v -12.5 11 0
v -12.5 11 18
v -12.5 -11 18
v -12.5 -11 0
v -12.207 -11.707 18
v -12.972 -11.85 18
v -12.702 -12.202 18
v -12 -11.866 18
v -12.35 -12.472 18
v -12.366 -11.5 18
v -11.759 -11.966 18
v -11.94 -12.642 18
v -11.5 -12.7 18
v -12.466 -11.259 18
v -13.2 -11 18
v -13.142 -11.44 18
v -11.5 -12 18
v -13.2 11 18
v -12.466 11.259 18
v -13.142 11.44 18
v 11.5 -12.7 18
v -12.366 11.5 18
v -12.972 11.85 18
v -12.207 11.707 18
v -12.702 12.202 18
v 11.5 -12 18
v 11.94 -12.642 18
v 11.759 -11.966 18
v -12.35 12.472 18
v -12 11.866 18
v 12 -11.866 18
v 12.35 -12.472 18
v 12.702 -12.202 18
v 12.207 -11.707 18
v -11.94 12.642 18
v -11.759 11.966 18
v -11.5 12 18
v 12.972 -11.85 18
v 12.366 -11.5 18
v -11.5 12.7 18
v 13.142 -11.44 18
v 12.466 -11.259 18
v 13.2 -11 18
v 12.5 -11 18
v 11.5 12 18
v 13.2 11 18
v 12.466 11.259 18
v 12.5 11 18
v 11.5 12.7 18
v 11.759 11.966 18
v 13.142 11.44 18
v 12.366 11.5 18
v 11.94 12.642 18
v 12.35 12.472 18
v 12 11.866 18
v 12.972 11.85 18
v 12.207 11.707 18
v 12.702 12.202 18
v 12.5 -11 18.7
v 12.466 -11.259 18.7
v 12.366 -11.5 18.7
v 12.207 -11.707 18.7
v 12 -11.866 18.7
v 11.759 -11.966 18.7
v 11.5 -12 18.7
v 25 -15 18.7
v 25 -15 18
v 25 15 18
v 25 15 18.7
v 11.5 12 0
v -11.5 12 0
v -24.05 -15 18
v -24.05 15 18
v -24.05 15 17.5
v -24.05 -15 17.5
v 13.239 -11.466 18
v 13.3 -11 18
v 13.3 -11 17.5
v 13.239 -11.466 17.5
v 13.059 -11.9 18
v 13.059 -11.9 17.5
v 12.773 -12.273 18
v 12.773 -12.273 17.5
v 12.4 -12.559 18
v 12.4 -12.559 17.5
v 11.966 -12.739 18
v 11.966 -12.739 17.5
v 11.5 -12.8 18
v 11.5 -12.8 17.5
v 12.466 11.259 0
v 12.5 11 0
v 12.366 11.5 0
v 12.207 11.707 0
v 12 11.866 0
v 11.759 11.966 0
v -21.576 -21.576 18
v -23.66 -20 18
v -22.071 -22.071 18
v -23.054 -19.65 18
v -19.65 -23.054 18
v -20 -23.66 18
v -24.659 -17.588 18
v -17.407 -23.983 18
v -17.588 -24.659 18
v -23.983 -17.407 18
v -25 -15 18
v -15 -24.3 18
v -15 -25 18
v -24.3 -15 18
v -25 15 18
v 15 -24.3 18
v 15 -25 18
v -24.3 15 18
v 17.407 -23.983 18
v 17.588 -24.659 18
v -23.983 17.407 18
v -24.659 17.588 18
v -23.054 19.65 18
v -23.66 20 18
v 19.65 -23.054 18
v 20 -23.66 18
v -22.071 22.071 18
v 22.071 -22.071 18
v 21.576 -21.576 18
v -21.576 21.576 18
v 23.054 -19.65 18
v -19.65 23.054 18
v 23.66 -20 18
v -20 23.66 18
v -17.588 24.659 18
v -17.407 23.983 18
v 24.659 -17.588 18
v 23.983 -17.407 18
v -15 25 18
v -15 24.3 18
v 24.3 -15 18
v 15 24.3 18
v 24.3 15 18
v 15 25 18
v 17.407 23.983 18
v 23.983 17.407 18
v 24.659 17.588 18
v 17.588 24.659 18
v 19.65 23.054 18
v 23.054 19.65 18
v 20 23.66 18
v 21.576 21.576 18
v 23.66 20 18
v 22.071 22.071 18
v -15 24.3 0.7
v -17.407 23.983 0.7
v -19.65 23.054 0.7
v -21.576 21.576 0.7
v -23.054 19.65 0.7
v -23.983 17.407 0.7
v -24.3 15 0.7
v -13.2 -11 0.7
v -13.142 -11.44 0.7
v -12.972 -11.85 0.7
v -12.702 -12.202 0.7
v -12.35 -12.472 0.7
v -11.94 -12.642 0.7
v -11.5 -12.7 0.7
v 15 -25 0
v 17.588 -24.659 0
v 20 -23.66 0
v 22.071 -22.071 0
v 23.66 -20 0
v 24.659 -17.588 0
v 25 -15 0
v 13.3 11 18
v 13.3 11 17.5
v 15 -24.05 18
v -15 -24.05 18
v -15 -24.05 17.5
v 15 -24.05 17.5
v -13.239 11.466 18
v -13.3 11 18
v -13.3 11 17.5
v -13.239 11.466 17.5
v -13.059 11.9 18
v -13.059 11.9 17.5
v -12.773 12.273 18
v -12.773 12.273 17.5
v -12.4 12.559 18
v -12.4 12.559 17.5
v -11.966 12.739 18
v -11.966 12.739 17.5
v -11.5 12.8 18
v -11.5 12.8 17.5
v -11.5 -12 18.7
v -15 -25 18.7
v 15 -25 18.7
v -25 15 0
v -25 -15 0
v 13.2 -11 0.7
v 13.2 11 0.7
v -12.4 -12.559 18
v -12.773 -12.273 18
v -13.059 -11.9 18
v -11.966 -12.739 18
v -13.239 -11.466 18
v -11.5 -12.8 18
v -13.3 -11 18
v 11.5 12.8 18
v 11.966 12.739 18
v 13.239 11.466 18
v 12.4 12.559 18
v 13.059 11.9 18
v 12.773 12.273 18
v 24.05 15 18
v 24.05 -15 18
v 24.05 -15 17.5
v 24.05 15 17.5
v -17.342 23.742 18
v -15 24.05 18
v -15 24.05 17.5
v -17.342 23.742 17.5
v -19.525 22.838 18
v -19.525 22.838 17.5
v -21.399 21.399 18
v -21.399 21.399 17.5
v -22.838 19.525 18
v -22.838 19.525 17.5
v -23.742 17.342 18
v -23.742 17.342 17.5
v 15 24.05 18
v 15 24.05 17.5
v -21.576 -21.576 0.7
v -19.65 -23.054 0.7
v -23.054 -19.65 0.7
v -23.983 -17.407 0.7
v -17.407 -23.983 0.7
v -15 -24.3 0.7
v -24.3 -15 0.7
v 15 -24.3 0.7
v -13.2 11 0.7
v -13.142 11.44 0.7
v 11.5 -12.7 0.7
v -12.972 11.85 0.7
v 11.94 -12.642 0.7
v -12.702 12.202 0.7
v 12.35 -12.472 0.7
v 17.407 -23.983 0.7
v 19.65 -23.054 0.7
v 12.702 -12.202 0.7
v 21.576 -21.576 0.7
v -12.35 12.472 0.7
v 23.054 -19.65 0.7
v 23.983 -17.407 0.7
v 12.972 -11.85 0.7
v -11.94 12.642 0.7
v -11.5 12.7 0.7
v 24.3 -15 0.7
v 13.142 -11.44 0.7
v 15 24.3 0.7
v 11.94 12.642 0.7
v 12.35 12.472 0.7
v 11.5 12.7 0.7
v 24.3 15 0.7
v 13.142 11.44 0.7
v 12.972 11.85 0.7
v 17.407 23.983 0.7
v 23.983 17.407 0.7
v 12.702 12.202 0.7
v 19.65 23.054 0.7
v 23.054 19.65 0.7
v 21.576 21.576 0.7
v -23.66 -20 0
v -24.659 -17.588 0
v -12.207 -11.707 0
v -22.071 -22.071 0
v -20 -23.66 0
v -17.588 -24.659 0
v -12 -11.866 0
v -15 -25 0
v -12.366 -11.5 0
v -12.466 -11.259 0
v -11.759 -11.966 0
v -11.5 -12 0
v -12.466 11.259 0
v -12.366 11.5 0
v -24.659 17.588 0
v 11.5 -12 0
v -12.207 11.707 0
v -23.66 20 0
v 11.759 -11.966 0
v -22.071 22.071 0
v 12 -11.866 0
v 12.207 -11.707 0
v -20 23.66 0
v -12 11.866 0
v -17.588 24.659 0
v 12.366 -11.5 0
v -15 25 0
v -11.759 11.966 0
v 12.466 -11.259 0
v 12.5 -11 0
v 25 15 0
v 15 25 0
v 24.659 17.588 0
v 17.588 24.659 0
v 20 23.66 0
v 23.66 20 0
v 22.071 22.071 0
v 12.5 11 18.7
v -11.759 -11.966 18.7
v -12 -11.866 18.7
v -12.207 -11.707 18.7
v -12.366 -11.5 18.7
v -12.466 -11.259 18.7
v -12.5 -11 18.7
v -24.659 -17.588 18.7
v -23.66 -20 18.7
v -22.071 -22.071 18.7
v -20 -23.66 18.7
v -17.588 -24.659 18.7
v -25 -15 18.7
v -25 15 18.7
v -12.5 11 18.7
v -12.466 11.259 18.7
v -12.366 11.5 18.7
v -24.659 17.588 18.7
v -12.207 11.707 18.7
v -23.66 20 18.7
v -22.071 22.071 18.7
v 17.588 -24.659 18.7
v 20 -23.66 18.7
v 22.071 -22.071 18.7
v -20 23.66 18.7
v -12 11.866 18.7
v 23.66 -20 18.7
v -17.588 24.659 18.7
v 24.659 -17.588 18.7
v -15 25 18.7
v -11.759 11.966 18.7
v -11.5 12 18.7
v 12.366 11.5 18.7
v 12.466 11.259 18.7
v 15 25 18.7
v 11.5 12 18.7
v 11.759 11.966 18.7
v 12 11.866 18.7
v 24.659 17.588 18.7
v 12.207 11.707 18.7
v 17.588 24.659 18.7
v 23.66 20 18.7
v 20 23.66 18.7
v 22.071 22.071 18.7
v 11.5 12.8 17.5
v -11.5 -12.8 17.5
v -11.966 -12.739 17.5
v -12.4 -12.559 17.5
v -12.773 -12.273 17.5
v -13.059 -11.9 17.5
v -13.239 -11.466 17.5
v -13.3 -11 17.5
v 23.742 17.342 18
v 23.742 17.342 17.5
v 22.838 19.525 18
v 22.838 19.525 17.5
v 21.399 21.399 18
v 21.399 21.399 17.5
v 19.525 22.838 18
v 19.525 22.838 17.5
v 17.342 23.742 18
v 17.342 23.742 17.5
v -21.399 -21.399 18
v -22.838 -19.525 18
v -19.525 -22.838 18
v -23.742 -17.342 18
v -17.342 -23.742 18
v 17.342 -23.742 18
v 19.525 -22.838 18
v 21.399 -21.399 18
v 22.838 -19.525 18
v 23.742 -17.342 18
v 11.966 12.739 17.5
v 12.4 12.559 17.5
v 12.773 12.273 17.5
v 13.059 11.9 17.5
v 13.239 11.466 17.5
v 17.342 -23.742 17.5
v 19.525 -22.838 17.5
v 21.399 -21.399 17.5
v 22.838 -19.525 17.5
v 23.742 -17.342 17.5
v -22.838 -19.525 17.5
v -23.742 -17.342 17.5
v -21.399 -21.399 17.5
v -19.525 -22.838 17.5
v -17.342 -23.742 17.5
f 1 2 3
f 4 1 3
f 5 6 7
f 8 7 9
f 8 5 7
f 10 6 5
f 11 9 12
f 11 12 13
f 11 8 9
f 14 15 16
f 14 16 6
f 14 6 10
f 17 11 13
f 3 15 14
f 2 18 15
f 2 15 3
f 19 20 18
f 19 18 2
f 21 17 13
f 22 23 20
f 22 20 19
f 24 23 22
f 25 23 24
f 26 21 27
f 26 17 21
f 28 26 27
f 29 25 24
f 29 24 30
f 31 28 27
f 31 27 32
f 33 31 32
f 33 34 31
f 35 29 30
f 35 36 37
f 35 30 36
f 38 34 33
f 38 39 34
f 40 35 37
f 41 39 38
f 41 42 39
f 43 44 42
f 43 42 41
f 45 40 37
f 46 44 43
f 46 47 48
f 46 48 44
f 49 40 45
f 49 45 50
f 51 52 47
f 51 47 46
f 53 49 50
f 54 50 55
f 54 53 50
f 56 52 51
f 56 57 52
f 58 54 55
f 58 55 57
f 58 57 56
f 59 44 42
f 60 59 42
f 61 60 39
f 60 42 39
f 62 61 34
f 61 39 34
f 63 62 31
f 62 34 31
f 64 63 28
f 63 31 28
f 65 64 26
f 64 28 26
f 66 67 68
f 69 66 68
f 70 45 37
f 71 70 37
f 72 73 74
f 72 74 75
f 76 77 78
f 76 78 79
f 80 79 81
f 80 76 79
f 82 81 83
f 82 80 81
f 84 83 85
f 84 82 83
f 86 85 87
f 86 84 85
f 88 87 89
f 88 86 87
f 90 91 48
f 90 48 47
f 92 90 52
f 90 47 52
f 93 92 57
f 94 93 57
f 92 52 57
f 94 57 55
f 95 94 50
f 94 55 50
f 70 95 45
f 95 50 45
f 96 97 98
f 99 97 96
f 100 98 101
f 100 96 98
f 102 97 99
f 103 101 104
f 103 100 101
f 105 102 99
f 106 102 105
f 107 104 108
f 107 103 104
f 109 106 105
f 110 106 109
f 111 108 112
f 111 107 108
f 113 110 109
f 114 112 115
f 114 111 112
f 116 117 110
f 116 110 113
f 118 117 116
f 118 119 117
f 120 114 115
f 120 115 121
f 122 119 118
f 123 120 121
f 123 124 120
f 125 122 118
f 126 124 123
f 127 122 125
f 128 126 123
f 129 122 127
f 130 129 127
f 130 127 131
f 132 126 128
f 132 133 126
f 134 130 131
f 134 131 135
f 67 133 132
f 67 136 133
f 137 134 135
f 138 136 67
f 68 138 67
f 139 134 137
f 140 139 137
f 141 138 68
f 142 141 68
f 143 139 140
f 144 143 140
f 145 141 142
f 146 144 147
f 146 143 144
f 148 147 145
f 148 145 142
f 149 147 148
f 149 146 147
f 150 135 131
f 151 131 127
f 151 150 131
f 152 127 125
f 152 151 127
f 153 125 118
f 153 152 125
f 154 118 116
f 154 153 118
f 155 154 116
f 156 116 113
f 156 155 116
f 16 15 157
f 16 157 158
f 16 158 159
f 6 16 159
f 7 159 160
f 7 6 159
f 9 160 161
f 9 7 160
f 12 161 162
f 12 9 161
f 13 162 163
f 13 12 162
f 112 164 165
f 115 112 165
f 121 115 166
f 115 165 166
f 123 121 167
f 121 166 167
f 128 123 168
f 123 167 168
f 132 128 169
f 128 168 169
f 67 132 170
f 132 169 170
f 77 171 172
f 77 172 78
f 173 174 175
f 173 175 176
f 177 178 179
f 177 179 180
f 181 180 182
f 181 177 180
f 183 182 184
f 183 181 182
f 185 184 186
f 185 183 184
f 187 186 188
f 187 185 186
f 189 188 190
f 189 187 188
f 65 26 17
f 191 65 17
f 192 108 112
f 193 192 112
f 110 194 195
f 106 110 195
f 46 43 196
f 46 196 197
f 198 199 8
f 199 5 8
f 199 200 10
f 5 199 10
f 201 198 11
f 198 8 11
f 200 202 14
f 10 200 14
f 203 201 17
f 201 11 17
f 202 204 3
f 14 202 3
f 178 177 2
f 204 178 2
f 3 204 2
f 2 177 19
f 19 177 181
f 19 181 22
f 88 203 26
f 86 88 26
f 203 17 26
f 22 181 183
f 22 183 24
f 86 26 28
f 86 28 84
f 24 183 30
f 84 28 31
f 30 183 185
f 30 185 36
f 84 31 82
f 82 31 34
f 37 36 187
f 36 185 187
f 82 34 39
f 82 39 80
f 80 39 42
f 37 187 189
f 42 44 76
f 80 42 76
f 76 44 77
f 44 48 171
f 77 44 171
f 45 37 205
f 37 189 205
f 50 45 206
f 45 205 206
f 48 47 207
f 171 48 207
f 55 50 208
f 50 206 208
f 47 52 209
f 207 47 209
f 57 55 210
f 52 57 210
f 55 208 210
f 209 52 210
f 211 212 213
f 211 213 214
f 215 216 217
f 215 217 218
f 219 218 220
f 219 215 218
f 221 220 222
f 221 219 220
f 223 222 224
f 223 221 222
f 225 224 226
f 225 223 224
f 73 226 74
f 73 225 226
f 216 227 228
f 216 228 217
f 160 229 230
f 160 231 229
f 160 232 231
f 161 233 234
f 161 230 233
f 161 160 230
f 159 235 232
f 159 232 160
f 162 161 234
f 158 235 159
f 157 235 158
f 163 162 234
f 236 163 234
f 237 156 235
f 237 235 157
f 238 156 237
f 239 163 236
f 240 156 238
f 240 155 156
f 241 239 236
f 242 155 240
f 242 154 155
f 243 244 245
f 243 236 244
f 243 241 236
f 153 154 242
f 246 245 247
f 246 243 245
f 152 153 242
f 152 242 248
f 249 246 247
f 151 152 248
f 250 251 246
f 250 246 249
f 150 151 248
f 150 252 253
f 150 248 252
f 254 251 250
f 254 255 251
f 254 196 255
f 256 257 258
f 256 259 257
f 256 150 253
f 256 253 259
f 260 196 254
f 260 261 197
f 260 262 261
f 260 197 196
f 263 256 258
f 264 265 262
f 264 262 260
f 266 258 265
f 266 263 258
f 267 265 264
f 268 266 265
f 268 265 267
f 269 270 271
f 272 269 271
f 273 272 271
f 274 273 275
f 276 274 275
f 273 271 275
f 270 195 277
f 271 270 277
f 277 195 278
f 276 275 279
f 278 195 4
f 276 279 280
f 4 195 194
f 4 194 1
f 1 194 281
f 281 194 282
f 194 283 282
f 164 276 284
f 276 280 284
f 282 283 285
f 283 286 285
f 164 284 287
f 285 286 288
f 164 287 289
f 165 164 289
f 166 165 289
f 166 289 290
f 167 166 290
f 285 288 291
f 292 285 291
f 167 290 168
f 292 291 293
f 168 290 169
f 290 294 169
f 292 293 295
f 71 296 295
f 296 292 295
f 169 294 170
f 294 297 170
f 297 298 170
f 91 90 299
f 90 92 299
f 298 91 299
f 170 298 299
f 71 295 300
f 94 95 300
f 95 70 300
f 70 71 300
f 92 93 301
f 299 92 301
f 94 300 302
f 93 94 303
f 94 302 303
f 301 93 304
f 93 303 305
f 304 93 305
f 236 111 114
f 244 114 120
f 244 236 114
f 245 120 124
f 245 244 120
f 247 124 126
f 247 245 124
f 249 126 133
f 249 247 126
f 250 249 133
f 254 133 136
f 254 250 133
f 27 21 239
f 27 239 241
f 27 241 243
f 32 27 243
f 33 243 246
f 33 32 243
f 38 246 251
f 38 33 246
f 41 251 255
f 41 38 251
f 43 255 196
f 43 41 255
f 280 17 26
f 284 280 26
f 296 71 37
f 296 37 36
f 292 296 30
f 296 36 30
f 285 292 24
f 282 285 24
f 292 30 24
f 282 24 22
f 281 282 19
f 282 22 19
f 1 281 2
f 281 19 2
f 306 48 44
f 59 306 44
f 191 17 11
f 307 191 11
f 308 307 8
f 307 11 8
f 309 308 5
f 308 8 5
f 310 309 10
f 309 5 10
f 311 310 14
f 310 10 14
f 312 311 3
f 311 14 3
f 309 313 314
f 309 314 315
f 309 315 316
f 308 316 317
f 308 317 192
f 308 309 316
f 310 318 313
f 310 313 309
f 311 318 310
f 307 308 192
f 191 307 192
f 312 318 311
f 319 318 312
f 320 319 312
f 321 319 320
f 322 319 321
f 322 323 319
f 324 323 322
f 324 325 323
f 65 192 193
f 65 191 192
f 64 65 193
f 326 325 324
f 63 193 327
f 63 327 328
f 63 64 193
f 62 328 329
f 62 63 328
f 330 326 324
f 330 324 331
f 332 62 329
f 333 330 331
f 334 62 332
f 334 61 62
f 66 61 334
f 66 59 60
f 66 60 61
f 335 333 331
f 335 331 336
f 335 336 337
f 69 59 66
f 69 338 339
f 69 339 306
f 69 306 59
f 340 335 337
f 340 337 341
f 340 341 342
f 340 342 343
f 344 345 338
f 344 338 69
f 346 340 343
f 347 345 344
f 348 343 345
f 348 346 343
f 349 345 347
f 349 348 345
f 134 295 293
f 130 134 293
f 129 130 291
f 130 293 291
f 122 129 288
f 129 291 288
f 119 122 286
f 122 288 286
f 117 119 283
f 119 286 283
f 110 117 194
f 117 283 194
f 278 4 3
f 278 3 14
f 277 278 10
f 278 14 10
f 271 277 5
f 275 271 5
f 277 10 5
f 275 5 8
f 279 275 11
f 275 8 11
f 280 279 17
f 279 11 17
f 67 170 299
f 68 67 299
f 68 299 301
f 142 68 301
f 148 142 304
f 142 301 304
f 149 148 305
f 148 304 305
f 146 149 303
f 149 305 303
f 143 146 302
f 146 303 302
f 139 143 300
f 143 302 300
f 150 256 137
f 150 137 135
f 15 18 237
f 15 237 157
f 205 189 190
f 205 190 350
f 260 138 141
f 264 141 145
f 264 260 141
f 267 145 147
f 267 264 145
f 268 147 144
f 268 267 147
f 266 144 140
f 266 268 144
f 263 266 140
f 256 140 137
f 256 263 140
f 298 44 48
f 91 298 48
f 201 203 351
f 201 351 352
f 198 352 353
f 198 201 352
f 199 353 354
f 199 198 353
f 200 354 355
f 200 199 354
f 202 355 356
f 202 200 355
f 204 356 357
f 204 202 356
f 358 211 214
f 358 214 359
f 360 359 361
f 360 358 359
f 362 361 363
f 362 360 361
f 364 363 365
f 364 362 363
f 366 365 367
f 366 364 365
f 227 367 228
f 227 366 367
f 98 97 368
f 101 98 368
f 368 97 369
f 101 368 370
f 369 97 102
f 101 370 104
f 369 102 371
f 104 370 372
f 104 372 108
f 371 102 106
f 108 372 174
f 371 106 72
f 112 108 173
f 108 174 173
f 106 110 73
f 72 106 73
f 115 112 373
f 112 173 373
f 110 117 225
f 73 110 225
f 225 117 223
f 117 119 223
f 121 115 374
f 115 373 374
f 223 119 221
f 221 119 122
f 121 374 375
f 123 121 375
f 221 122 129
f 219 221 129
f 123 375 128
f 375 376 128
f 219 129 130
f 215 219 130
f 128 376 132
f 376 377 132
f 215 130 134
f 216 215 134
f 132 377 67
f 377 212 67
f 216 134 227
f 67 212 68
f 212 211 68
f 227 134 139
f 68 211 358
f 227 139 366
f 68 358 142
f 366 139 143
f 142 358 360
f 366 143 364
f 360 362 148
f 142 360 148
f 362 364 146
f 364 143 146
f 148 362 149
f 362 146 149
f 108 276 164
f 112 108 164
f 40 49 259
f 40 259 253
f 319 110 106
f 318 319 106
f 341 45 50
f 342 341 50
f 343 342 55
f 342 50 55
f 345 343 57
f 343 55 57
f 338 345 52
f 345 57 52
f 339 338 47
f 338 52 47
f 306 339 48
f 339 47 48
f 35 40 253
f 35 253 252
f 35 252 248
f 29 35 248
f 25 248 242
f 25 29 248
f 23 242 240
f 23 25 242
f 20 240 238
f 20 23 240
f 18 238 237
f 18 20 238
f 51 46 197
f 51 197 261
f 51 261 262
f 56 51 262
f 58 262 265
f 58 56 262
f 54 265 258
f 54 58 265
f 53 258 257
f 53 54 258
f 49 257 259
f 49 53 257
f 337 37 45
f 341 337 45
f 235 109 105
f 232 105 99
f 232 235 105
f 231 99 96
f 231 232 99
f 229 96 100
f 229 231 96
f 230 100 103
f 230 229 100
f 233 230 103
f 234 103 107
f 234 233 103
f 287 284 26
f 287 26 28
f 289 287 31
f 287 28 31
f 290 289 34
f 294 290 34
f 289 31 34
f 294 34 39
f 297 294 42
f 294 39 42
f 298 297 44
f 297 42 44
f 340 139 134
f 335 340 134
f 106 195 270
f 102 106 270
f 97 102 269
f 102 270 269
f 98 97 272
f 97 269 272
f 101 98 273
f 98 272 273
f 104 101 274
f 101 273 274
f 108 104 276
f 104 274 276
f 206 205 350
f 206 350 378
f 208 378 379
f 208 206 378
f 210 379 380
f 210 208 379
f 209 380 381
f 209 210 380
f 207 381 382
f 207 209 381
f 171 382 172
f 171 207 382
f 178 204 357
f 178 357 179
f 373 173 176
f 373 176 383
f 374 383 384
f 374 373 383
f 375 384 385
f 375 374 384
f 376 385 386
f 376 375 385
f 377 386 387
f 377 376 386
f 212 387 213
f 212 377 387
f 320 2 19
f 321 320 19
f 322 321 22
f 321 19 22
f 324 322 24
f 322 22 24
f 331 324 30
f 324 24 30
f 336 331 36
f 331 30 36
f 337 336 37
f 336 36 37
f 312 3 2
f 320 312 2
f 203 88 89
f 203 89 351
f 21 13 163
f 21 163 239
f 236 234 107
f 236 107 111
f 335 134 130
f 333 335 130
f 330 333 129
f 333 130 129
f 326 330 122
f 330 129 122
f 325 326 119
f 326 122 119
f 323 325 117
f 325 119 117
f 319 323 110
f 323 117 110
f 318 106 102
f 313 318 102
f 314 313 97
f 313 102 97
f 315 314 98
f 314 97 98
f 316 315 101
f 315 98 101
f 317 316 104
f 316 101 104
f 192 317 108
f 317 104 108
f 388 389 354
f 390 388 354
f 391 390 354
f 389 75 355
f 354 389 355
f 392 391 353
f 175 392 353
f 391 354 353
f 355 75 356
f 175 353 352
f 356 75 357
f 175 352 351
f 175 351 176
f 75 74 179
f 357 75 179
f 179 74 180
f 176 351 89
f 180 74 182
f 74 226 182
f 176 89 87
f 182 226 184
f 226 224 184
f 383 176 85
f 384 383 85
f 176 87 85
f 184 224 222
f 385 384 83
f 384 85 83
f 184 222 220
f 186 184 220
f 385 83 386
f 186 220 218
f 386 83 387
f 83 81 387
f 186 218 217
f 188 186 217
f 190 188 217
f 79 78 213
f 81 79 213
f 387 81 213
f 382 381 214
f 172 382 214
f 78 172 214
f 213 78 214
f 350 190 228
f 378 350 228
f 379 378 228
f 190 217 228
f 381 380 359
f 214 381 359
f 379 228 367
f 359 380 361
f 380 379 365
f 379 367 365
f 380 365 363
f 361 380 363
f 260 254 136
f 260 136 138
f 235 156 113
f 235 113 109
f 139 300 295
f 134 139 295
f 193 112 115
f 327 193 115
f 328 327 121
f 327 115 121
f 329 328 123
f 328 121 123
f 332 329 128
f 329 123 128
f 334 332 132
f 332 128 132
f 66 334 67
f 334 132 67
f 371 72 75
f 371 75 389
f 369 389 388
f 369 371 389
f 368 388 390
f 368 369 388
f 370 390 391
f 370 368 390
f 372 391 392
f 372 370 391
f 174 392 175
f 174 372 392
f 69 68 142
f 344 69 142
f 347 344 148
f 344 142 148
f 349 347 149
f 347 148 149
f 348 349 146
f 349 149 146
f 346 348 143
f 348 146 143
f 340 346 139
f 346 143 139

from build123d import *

# Parameters (mm, degrees)
F1_DEPTH = 18
F3_DEPTH = 18.001
F4_T     = -0.7
F6_DEPTH = 0.5
F8_DEPTH = 0.7


with BuildPart() as f1:
    # F0 (on Top) → F1 (new body)
    with BuildSketch(Plane.XY):
        with BuildLine():
            ThreePointArc((25, 15), (22.0710678119, 22.0710678119), (15, 25))
            Line((15, 25), (-15, 25))
            ThreePointArc((-15, 25), (-22.0710678119, 22.0710678119), (-25, 15))
            Line((-25, 15), (-25, -15))
            ThreePointArc((-25, -15), (-22.0710678119, -22.0710678119), (-15, -25))
            Line((-15, -25), (15, -25))
            ThreePointArc((15, -25), (22.0710678119, -22.0710678119), (25, -15))
            Line((25, -15), (25, 15))
        make_face()
    extrude(amount=F1_DEPTH)

    # F2 (on face) → F3 (cut, through all)
    with BuildSketch(Plane.XY.offset(18)):
        with BuildLine():
            ThreePointArc((12.5, 11), (12.2071067812, 11.7071067812), (11.5, 12))
            Line((11.5, 12), (-11.5, 12))
            ThreePointArc((-11.5, 12), (-12.2071067812, 11.7071067812), (-12.5, 11))
            Line((-12.5, 11), (-12.5, -11))
            ThreePointArc((-12.5, -11), (-12.2071067812, -11.7071067812), (-11.5, -12))
            Line((-11.5, -12), (11.5, -12))
            ThreePointArc((11.5, -12), (12.2071067812, -11.7071067812), (12.5, -11))
            Line((12.5, -11), (12.5, 11))
        make_face()
    extrude(amount=-F3_DEPTH, mode=Mode.SUBTRACT)

    # F4
    f4_openings = [f1.faces().sort_by_distance(p)[0] for p in [
        (24.292893, 0, 18),
    ]]
    offset(amount=F4_T, openings=f4_openings)


with BuildPart() as f6:
    # F5 (on face) → F6 (new body)
    with BuildSketch(Plane.XY.offset(18)):
        with BuildLine():
            Line((-24.05, 15), (-24.05, -15))
            ThreePointArc((-24.05, -15), (-21.3993163697, -21.3993163697), (-15, -24.05))
            Line((-15, -24.05), (15, -24.05))
            ThreePointArc((15, -24.05), (21.3993163697, -21.3993163697), (24.05, -15))
            Line((24.05, -15), (24.05, 15))
            ThreePointArc((24.05, 15), (21.3993163697, 21.3993163697), (15, 24.05))
            Line((15, 24.05), (-15, 24.05))
            ThreePointArc((-15, 24.05), (-21.3993163697, 21.3993163697), (-24.05, 15))
        make_face()
        with BuildLine():
            ThreePointArc((15, 23.5), (21.0104076401, 21.0104076401), (23.5, 15))
            Line((23.5, 15), (23.5, -15))
            ThreePointArc((23.5, -15), (21.0104076401, -21.0104076401), (15, -23.5))
            Line((15, -23.5), (-15, -23.5))
            ThreePointArc((-15, -23.5), (-21.0104076401, -21.0104076401), (-23.5, -15))
            Line((-23.5, -15), (-23.5, 15))
            ThreePointArc((-23.5, 15), (-21.0104076401, 21.0104076401), (-15, 23.5))
            Line((-15, 23.5), (15, 23.5))
        make_face(mode=Mode.SUBTRACT)
        with BuildLine():
            Line((23.5, -15), (23.5, 15))
            ThreePointArc((23.5, 15), (21.0104076401, 21.0104076401), (15, 23.5))
            Line((15, 23.5), (-15, 23.5))
            ThreePointArc((-15, 23.5), (-21.0104076401, 21.0104076401), (-23.5, 15))
            Line((-23.5, 15), (-23.5, -15))
            ThreePointArc((-23.5, -15), (-21.0104076401, -21.0104076401), (-15, -23.5))
            Line((-15, -23.5), (15, -23.5))
            ThreePointArc((15, -23.5), (21.0104076401, -21.0104076401), (23.5, -15))
        make_face()
        with BuildLine():
            ThreePointArc((11.5, 12.8), (12.7727922061, 12.2727922061), (13.3, 11))
            Line((13.3, 11), (13.3, -11))
            ThreePointArc((13.3, -11), (12.7727922061, -12.2727922061), (11.5, -12.8))
            Line((11.5, -12.8), (-11.5, -12.8))
            ThreePointArc((-11.5, -12.8), (-12.7727922061, -12.2727922061), (-13.3, -11))
            Line((-13.3, -11), (-13.3, 11))
            ThreePointArc((-13.3, 11), (-12.7727922061, 12.2727922061), (-11.5, 12.8))
            Line((-11.5, 12.8), (11.5, 12.8))
        make_face(mode=Mode.SUBTRACT)
    extrude(amount=-F6_DEPTH)

    # F7 (on face) + F6_face1 (on face) → F8 (join)
    with BuildSketch(Plane.XY.offset(18)):
        with BuildLine():
            Line((15, 25), (-15, 25))
            ThreePointArc((-15, 25), (-22.0710678119, 22.0710678119), (-25, 15))
            Line((-25, 15), (-25, -15))
            ThreePointArc((-25, -15), (-22.0710678119, -22.0710678119), (-15, -25))
            Line((-15, -25), (15, -25))
            ThreePointArc((15, -25), (22.0710678119, -22.0710678119), (25, -15))
            Line((25, -15), (25, 15))
            ThreePointArc((25, 15), (22.0710678119, 22.0710678119), (15, 25))
        make_face()
        with BuildLine():
            Line((-12.5, -11), (-12.5, 11))
            ThreePointArc((-12.5, 11), (-12.2071067812, 11.7071067812), (-11.5, 12))
            Line((-11.5, 12), (11.5, 12))
            ThreePointArc((11.5, 12), (12.2071067812, 11.7071067812), (12.5, 11))
            Line((12.5, 11), (12.5, -11))
            ThreePointArc((12.5, -11), (12.2071067812, -11.7071067812), (11.5, -12))
            Line((11.5, -12), (-11.5, -12))
            ThreePointArc((-11.5, -12), (-12.2071067812, -11.7071067812), (-12.5, -11))
        make_face(mode=Mode.SUBTRACT)
    with BuildSketch(Plane(origin=(0, 0, 17.5), x_dir=(1, 0, 0), z_dir=(0, 0, -1))):
        with BuildLine():
            Line((-15, -24.05), (15, -24.05))
            ThreePointArc((15, -24.05), (21.3993163697, -21.3993163697), (24.05, -15))
            Line((24.05, -15), (24.05, 15))
            ThreePointArc((24.05, 15), (21.3993163697, 21.3993163697), (15, 24.05))
            Line((15, 24.05), (-15, 24.05))
            ThreePointArc((-15, 24.05), (-21.3993163697, 21.3993163697), (-24.05, 15))
            Line((-24.05, 15), (-24.05, -15))
            ThreePointArc((-24.05, -15), (-21.3993163697, -21.3993163697), (-15, -24.05))
        make_face()
        with BuildLine():
            ThreePointArc((13.3, -11), (12.7727922061, -12.2727922061), (11.5, -12.8))
            Line((11.5, -12.8), (-11.5, -12.8))
            ThreePointArc((-11.5, -12.8), (-12.7727922061, -12.2727922061), (-13.3, -11))
            Line((-13.3, -11), (-13.3, 11))
            ThreePointArc((-13.3, 11), (-12.7727922061, 12.2727922061), (-11.5, 12.8))
            Line((-11.5, 12.8), (11.5, 12.8))
            ThreePointArc((11.5, 12.8), (12.7727922061, 12.2727922061), (13.3, 11))
            Line((13.3, 11), (13.3, -11))
        make_face(mode=Mode.SUBTRACT)
    extrude(amount=F8_DEPTH, dir=(0, 0, 1))


solid = Compound([f1.part, f6.part])
